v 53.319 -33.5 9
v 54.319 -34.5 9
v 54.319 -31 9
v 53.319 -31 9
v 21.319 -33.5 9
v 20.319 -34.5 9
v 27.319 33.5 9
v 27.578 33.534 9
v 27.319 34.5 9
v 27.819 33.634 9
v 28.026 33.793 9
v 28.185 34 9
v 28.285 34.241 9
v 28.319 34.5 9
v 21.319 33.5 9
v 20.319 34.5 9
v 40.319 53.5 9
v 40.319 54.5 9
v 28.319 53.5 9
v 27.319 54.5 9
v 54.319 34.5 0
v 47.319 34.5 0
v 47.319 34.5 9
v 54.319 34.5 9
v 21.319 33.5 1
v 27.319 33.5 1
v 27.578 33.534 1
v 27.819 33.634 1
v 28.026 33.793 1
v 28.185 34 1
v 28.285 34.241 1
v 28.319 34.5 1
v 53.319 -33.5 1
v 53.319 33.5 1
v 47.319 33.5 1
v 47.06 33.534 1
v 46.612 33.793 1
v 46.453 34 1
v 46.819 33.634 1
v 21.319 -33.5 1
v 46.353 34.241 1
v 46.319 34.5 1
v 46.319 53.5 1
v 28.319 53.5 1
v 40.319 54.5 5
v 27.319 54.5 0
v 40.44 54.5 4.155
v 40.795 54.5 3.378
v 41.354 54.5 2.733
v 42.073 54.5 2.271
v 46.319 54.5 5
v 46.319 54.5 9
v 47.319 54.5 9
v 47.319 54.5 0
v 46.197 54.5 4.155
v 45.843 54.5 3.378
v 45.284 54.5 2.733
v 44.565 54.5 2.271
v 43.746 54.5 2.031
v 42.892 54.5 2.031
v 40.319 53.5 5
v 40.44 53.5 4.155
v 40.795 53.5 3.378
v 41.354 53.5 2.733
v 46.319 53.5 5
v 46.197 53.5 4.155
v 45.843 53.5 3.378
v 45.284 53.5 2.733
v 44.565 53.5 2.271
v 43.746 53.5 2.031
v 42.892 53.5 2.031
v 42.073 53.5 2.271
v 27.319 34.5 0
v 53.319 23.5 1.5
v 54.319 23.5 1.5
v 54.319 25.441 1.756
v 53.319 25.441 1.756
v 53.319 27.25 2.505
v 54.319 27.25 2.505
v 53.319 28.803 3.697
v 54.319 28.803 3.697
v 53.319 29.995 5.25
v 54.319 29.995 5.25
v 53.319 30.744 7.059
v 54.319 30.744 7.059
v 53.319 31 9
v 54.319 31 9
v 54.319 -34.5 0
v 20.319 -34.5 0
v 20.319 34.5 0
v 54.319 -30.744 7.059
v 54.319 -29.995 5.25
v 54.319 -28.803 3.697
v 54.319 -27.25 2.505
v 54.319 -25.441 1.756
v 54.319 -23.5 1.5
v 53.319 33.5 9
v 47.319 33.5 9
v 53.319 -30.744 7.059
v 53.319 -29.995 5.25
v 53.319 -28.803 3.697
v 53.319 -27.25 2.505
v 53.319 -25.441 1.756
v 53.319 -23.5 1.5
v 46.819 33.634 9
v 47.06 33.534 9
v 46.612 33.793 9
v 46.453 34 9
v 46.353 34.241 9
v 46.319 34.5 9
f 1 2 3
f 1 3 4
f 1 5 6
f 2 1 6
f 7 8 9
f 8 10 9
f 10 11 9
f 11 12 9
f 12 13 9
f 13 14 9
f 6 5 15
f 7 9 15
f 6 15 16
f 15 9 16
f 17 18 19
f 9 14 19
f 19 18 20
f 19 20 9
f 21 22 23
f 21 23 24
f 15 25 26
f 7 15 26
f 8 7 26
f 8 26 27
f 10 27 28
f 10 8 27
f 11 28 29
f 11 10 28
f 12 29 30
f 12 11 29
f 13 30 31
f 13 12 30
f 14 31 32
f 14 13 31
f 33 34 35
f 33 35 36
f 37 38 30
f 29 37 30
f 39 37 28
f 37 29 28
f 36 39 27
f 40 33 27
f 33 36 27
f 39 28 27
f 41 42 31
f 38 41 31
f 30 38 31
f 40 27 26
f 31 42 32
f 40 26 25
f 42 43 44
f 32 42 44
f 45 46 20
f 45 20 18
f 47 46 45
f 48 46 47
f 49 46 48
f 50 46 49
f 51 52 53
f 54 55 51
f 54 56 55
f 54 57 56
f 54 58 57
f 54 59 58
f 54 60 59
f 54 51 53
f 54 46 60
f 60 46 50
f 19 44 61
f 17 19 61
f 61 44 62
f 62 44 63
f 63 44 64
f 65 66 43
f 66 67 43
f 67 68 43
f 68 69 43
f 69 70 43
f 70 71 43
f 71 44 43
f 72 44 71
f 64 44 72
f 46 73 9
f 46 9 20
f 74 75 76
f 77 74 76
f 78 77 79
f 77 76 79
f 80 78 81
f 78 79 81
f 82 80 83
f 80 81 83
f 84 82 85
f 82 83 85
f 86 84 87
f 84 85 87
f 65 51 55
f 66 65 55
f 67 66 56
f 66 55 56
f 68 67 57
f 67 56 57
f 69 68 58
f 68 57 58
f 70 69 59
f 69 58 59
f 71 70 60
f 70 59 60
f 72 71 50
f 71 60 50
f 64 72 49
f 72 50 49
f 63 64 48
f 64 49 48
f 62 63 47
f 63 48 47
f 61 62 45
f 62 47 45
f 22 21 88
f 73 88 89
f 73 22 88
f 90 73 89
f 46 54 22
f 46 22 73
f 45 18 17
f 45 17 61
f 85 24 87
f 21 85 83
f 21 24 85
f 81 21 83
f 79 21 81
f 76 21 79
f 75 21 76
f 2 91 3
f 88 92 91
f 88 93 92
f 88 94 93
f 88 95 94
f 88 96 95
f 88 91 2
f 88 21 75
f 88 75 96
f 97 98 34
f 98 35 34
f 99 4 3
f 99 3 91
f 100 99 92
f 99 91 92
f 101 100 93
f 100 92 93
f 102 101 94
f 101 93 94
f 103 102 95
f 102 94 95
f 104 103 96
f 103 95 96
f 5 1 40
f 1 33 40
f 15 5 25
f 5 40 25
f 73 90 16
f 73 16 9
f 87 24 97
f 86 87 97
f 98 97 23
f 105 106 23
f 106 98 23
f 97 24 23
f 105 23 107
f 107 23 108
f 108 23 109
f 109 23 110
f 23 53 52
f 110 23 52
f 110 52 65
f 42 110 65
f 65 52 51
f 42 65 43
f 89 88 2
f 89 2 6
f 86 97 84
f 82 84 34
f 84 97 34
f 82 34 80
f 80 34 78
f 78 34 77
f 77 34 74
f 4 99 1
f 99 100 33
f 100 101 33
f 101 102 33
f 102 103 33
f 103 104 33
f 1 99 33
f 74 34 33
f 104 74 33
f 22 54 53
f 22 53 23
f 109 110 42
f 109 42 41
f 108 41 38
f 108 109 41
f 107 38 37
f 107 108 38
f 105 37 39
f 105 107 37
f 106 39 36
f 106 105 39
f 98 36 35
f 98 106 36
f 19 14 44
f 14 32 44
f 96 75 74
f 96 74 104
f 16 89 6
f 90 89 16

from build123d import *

# Parameters (mm, degrees)
PAD005_DEPTH    = 9
THICKNESS001_T  = -1
POCKET003_DEPTH = 1
POCKET004_DEPTH = 1


with BuildPart() as part:
    # Sketch008 → Pad005 (new body)
    with BuildSketch(Plane.XY):
        Polygon((20.318948, 34.5), (27.318948, 34.5), (27.318948, 54.5), (47.318948, 54.5), (47.318948, 34.5), (54.318948, 34.5), (54.318948, -34.5), (20.318948, -34.5), align=None)
    extrude(amount=PAD005_DEPTH)

    # Thickness001
    thickness001_openings = [part.faces().sort_by_distance(p)[0] for p in [
        (37.318948, 6.482156, 9),
    ]]
    offset(amount=THICKNESS001_T, openings=thickness001_openings)

    # Sketch009 (on Face3 of Thickness001) → Pocket003 (cut)
    with BuildSketch(Plane(origin=(0, 54.5, 0), x_dir=(-1, 0, 0), z_dir=(0, 1, 0))):
        with BuildLine():
            ThreePointArc((-40.318948, 9), (-43.318948, 12), (-46.318948, 9))
            Line((-46.318948, 9), (-46.318948, 5))
            ThreePointArc((-46.318948, 5), (-43.318948, 2), (-40.318948, 5))
            Line((-40.318948, 9), (-40.318948, 5))
        make_face()
    extrude(amount=-POCKET003_DEPTH, mode=Mode.SUBTRACT)

    # Sketch010 (on Face10 of Pocket003) → Pocket004 (cut)
    with BuildSketch(Plane.YZ.offset(54.318948)):
        with BuildLine():
            ThreePointArc((23.5, 1.5), (31, 9), (23.5, 16.5))
            Line((23.5, 16.5), (-23.5, 16.5))
            ThreePointArc((-23.5, 16.5), (-31, 9), (-23.5, 1.5))
            Line((23.5, 1.5), (-23.5, 1.5))
        make_face()
    extrude(amount=-POCKET004_DEPTH, mode=Mode.SUBTRACT)


solid = part.part
